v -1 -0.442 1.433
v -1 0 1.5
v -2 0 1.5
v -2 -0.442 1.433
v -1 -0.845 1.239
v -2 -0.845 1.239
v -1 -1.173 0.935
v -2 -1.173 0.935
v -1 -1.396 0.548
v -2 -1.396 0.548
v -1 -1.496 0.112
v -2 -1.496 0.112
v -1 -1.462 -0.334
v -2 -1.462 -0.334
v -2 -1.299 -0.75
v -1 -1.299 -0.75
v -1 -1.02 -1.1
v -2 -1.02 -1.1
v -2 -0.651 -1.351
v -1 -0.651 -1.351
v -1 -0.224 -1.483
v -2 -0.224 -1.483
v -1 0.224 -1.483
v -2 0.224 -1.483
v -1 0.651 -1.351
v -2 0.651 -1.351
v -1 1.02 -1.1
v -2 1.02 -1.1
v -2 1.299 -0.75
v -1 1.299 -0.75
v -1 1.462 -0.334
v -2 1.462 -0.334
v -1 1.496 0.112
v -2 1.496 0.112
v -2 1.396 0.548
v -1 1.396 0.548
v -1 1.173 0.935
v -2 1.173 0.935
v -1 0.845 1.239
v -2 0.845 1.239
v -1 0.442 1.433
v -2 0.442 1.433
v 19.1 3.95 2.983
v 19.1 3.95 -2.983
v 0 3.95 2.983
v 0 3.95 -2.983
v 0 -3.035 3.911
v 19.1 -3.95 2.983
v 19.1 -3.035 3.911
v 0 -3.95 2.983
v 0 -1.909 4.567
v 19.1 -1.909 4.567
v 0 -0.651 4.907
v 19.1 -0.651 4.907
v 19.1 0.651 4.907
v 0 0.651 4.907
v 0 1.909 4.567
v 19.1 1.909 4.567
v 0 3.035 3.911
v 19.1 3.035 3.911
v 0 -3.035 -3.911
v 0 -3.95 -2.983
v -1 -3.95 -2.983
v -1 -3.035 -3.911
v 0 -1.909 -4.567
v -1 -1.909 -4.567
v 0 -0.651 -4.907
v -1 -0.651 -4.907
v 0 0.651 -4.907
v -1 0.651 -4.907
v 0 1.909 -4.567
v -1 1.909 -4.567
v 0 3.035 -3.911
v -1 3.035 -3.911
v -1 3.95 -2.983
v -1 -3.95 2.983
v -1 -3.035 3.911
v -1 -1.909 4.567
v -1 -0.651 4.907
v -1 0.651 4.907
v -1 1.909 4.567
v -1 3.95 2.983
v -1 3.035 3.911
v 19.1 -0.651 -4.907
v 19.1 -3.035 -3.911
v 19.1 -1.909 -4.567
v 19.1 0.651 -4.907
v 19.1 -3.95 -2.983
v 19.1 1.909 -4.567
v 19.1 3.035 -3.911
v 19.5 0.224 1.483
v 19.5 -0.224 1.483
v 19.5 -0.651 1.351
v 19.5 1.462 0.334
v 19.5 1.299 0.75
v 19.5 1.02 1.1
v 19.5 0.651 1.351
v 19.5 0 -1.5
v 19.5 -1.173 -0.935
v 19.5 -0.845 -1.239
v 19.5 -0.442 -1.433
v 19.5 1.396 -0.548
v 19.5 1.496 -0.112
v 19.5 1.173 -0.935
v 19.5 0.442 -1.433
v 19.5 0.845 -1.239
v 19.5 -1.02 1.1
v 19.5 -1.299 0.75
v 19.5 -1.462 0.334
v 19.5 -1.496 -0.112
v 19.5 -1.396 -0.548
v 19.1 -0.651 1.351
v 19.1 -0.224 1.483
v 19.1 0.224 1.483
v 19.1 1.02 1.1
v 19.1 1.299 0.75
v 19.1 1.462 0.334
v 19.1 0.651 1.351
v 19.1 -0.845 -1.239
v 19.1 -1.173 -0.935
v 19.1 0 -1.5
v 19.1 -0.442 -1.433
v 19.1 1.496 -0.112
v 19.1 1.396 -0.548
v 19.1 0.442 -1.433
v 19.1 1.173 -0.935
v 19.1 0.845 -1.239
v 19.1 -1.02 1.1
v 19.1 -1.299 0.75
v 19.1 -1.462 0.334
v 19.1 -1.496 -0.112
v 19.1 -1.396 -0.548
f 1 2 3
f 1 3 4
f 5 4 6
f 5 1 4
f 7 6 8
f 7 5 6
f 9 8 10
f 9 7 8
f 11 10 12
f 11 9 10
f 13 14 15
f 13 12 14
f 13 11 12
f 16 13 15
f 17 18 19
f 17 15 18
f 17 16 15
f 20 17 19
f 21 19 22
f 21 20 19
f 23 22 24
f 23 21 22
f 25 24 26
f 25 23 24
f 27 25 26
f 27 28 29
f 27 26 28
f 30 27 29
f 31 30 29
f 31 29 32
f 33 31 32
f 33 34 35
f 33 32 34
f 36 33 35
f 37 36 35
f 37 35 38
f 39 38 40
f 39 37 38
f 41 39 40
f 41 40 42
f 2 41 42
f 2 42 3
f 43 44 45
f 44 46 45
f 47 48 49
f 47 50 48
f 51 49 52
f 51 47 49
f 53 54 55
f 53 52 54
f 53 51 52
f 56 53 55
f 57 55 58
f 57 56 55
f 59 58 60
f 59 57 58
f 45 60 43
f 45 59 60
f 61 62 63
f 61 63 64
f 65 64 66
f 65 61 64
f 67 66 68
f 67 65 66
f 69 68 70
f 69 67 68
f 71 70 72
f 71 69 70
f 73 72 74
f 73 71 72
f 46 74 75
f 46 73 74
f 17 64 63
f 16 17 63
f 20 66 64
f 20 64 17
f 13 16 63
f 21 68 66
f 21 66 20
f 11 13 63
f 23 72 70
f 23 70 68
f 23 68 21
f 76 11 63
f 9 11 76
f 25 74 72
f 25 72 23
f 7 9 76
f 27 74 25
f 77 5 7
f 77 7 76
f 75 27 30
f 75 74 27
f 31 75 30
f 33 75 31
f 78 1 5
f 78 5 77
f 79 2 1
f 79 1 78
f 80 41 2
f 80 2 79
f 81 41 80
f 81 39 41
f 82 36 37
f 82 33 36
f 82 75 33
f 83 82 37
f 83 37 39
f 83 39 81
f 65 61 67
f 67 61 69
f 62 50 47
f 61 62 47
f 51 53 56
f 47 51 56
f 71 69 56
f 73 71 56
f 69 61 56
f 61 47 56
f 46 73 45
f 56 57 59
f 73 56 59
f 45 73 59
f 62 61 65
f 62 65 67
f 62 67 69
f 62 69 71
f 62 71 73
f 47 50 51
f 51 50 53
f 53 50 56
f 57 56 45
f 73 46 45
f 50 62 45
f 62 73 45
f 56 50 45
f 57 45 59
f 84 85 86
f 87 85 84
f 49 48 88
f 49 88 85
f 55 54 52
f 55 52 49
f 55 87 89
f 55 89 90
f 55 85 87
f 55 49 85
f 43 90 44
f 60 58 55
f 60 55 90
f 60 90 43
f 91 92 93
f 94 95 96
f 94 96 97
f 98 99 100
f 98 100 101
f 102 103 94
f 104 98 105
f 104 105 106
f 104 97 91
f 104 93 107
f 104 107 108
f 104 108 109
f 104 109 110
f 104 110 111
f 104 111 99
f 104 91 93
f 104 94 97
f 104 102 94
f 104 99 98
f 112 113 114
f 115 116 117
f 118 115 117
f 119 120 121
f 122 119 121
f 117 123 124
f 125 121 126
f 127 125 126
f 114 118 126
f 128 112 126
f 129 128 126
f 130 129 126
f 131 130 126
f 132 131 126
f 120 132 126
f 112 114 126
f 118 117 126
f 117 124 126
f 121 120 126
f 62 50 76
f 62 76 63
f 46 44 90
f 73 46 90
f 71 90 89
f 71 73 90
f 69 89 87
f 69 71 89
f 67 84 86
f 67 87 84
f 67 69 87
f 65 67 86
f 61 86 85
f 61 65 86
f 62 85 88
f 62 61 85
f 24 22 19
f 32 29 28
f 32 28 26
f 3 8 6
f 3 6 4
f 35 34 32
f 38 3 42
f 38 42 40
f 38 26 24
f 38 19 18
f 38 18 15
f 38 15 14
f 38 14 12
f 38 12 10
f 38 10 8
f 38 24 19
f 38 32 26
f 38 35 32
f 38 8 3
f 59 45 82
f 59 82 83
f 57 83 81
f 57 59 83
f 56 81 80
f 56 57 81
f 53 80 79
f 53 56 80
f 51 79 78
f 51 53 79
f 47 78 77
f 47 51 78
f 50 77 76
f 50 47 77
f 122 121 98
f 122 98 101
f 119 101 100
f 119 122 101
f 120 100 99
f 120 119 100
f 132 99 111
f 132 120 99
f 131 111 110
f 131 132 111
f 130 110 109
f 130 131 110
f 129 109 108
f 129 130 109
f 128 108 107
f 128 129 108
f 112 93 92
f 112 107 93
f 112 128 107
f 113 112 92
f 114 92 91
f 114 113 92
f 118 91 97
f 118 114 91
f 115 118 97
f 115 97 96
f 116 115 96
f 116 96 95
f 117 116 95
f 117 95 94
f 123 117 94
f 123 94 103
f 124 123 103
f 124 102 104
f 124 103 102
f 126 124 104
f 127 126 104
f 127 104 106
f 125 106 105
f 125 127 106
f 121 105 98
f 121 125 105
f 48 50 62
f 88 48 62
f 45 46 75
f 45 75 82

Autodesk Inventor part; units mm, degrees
ref_plane "YZ Plane" through (0, 0, 0) normal (1, 0, 0) x (0, 1, 0)
ref_plane "XZ Plane" through (0, 0, 0) normal (0, 1, 0) x (-1, 0, 0)
ref_plane "XY Plane" through (0, 0, 0) normal (0, 0, 1) x (1, 0, 0)
sketch "Sketch1" plane through (0, 0, 0) normal (1, 0, 0) x (0, 1, 0)
  circle A0 centre (0, 0) radius 4.95
  line L0 (-3.95, -2.9833) -> (3.95, -2.9833)
  line L1 (3.95, -2.9833) -> (3.95, 2.9833)
  line L2 (3.95, 2.9833) -> (-3.95, 2.9833)
  line L3 (-3.95, 2.9833) -> (-3.95, -2.9833)
  line L4 (-3.95, -2.9833) -> (3.95, 2.9833) construction
  line L5 (3.95, -2.9833) -> (-3.95, 2.9833) construction
  dimension "d0" = 9.9
  dimension "d1" = 7.9
extrude "Extrusion1" add sketch "Sketch1" along normal blind 19.1 contours L2 A0 | L1 L0 L3 L2 | A0 L0
sketch "Sketch2" plane through (19.1, 0, 0) normal (1, 0, 0) x (0, 0, -1)
  circle A0 centre (0, 0) radius 1.5
  dimension "d4" = 3
extrude "Extrusion2" add sketch "Sketch2" along normal blind 0.4 separate body
sketch "Sketch3" plane through (0, 0, 0) normal (-1, 0, 0) x (0, 0, 1)
  line L0 (-2.9833, 3.95) -> (2.9833, 3.95) projected
  arc A0 (-2.9833, 3.95) -> (-2.9833, -3.95) centre (0, 0) ccw projected
  line L1 (2.9833, -3.95) -> (-2.9833, -3.95) projected
  arc A1 (2.9833, -3.95) -> (2.9833, 3.95) centre (0, 0) ccw projected
extrude "Extrusion3" add sketch "Sketch3" along normal blind 1 separate body
sketch "Sketch4" plane through (-1, 0, 0) normal (-1, 0, 0) x (0, 0, 1)
  circle A0 centre (0, 0) radius 1.5
  dimension "d9" = 3
extrude "Extrusion4" add sketch "Sketch4" along normal blind 1 bodies 3
properties part number "motor_051115"
